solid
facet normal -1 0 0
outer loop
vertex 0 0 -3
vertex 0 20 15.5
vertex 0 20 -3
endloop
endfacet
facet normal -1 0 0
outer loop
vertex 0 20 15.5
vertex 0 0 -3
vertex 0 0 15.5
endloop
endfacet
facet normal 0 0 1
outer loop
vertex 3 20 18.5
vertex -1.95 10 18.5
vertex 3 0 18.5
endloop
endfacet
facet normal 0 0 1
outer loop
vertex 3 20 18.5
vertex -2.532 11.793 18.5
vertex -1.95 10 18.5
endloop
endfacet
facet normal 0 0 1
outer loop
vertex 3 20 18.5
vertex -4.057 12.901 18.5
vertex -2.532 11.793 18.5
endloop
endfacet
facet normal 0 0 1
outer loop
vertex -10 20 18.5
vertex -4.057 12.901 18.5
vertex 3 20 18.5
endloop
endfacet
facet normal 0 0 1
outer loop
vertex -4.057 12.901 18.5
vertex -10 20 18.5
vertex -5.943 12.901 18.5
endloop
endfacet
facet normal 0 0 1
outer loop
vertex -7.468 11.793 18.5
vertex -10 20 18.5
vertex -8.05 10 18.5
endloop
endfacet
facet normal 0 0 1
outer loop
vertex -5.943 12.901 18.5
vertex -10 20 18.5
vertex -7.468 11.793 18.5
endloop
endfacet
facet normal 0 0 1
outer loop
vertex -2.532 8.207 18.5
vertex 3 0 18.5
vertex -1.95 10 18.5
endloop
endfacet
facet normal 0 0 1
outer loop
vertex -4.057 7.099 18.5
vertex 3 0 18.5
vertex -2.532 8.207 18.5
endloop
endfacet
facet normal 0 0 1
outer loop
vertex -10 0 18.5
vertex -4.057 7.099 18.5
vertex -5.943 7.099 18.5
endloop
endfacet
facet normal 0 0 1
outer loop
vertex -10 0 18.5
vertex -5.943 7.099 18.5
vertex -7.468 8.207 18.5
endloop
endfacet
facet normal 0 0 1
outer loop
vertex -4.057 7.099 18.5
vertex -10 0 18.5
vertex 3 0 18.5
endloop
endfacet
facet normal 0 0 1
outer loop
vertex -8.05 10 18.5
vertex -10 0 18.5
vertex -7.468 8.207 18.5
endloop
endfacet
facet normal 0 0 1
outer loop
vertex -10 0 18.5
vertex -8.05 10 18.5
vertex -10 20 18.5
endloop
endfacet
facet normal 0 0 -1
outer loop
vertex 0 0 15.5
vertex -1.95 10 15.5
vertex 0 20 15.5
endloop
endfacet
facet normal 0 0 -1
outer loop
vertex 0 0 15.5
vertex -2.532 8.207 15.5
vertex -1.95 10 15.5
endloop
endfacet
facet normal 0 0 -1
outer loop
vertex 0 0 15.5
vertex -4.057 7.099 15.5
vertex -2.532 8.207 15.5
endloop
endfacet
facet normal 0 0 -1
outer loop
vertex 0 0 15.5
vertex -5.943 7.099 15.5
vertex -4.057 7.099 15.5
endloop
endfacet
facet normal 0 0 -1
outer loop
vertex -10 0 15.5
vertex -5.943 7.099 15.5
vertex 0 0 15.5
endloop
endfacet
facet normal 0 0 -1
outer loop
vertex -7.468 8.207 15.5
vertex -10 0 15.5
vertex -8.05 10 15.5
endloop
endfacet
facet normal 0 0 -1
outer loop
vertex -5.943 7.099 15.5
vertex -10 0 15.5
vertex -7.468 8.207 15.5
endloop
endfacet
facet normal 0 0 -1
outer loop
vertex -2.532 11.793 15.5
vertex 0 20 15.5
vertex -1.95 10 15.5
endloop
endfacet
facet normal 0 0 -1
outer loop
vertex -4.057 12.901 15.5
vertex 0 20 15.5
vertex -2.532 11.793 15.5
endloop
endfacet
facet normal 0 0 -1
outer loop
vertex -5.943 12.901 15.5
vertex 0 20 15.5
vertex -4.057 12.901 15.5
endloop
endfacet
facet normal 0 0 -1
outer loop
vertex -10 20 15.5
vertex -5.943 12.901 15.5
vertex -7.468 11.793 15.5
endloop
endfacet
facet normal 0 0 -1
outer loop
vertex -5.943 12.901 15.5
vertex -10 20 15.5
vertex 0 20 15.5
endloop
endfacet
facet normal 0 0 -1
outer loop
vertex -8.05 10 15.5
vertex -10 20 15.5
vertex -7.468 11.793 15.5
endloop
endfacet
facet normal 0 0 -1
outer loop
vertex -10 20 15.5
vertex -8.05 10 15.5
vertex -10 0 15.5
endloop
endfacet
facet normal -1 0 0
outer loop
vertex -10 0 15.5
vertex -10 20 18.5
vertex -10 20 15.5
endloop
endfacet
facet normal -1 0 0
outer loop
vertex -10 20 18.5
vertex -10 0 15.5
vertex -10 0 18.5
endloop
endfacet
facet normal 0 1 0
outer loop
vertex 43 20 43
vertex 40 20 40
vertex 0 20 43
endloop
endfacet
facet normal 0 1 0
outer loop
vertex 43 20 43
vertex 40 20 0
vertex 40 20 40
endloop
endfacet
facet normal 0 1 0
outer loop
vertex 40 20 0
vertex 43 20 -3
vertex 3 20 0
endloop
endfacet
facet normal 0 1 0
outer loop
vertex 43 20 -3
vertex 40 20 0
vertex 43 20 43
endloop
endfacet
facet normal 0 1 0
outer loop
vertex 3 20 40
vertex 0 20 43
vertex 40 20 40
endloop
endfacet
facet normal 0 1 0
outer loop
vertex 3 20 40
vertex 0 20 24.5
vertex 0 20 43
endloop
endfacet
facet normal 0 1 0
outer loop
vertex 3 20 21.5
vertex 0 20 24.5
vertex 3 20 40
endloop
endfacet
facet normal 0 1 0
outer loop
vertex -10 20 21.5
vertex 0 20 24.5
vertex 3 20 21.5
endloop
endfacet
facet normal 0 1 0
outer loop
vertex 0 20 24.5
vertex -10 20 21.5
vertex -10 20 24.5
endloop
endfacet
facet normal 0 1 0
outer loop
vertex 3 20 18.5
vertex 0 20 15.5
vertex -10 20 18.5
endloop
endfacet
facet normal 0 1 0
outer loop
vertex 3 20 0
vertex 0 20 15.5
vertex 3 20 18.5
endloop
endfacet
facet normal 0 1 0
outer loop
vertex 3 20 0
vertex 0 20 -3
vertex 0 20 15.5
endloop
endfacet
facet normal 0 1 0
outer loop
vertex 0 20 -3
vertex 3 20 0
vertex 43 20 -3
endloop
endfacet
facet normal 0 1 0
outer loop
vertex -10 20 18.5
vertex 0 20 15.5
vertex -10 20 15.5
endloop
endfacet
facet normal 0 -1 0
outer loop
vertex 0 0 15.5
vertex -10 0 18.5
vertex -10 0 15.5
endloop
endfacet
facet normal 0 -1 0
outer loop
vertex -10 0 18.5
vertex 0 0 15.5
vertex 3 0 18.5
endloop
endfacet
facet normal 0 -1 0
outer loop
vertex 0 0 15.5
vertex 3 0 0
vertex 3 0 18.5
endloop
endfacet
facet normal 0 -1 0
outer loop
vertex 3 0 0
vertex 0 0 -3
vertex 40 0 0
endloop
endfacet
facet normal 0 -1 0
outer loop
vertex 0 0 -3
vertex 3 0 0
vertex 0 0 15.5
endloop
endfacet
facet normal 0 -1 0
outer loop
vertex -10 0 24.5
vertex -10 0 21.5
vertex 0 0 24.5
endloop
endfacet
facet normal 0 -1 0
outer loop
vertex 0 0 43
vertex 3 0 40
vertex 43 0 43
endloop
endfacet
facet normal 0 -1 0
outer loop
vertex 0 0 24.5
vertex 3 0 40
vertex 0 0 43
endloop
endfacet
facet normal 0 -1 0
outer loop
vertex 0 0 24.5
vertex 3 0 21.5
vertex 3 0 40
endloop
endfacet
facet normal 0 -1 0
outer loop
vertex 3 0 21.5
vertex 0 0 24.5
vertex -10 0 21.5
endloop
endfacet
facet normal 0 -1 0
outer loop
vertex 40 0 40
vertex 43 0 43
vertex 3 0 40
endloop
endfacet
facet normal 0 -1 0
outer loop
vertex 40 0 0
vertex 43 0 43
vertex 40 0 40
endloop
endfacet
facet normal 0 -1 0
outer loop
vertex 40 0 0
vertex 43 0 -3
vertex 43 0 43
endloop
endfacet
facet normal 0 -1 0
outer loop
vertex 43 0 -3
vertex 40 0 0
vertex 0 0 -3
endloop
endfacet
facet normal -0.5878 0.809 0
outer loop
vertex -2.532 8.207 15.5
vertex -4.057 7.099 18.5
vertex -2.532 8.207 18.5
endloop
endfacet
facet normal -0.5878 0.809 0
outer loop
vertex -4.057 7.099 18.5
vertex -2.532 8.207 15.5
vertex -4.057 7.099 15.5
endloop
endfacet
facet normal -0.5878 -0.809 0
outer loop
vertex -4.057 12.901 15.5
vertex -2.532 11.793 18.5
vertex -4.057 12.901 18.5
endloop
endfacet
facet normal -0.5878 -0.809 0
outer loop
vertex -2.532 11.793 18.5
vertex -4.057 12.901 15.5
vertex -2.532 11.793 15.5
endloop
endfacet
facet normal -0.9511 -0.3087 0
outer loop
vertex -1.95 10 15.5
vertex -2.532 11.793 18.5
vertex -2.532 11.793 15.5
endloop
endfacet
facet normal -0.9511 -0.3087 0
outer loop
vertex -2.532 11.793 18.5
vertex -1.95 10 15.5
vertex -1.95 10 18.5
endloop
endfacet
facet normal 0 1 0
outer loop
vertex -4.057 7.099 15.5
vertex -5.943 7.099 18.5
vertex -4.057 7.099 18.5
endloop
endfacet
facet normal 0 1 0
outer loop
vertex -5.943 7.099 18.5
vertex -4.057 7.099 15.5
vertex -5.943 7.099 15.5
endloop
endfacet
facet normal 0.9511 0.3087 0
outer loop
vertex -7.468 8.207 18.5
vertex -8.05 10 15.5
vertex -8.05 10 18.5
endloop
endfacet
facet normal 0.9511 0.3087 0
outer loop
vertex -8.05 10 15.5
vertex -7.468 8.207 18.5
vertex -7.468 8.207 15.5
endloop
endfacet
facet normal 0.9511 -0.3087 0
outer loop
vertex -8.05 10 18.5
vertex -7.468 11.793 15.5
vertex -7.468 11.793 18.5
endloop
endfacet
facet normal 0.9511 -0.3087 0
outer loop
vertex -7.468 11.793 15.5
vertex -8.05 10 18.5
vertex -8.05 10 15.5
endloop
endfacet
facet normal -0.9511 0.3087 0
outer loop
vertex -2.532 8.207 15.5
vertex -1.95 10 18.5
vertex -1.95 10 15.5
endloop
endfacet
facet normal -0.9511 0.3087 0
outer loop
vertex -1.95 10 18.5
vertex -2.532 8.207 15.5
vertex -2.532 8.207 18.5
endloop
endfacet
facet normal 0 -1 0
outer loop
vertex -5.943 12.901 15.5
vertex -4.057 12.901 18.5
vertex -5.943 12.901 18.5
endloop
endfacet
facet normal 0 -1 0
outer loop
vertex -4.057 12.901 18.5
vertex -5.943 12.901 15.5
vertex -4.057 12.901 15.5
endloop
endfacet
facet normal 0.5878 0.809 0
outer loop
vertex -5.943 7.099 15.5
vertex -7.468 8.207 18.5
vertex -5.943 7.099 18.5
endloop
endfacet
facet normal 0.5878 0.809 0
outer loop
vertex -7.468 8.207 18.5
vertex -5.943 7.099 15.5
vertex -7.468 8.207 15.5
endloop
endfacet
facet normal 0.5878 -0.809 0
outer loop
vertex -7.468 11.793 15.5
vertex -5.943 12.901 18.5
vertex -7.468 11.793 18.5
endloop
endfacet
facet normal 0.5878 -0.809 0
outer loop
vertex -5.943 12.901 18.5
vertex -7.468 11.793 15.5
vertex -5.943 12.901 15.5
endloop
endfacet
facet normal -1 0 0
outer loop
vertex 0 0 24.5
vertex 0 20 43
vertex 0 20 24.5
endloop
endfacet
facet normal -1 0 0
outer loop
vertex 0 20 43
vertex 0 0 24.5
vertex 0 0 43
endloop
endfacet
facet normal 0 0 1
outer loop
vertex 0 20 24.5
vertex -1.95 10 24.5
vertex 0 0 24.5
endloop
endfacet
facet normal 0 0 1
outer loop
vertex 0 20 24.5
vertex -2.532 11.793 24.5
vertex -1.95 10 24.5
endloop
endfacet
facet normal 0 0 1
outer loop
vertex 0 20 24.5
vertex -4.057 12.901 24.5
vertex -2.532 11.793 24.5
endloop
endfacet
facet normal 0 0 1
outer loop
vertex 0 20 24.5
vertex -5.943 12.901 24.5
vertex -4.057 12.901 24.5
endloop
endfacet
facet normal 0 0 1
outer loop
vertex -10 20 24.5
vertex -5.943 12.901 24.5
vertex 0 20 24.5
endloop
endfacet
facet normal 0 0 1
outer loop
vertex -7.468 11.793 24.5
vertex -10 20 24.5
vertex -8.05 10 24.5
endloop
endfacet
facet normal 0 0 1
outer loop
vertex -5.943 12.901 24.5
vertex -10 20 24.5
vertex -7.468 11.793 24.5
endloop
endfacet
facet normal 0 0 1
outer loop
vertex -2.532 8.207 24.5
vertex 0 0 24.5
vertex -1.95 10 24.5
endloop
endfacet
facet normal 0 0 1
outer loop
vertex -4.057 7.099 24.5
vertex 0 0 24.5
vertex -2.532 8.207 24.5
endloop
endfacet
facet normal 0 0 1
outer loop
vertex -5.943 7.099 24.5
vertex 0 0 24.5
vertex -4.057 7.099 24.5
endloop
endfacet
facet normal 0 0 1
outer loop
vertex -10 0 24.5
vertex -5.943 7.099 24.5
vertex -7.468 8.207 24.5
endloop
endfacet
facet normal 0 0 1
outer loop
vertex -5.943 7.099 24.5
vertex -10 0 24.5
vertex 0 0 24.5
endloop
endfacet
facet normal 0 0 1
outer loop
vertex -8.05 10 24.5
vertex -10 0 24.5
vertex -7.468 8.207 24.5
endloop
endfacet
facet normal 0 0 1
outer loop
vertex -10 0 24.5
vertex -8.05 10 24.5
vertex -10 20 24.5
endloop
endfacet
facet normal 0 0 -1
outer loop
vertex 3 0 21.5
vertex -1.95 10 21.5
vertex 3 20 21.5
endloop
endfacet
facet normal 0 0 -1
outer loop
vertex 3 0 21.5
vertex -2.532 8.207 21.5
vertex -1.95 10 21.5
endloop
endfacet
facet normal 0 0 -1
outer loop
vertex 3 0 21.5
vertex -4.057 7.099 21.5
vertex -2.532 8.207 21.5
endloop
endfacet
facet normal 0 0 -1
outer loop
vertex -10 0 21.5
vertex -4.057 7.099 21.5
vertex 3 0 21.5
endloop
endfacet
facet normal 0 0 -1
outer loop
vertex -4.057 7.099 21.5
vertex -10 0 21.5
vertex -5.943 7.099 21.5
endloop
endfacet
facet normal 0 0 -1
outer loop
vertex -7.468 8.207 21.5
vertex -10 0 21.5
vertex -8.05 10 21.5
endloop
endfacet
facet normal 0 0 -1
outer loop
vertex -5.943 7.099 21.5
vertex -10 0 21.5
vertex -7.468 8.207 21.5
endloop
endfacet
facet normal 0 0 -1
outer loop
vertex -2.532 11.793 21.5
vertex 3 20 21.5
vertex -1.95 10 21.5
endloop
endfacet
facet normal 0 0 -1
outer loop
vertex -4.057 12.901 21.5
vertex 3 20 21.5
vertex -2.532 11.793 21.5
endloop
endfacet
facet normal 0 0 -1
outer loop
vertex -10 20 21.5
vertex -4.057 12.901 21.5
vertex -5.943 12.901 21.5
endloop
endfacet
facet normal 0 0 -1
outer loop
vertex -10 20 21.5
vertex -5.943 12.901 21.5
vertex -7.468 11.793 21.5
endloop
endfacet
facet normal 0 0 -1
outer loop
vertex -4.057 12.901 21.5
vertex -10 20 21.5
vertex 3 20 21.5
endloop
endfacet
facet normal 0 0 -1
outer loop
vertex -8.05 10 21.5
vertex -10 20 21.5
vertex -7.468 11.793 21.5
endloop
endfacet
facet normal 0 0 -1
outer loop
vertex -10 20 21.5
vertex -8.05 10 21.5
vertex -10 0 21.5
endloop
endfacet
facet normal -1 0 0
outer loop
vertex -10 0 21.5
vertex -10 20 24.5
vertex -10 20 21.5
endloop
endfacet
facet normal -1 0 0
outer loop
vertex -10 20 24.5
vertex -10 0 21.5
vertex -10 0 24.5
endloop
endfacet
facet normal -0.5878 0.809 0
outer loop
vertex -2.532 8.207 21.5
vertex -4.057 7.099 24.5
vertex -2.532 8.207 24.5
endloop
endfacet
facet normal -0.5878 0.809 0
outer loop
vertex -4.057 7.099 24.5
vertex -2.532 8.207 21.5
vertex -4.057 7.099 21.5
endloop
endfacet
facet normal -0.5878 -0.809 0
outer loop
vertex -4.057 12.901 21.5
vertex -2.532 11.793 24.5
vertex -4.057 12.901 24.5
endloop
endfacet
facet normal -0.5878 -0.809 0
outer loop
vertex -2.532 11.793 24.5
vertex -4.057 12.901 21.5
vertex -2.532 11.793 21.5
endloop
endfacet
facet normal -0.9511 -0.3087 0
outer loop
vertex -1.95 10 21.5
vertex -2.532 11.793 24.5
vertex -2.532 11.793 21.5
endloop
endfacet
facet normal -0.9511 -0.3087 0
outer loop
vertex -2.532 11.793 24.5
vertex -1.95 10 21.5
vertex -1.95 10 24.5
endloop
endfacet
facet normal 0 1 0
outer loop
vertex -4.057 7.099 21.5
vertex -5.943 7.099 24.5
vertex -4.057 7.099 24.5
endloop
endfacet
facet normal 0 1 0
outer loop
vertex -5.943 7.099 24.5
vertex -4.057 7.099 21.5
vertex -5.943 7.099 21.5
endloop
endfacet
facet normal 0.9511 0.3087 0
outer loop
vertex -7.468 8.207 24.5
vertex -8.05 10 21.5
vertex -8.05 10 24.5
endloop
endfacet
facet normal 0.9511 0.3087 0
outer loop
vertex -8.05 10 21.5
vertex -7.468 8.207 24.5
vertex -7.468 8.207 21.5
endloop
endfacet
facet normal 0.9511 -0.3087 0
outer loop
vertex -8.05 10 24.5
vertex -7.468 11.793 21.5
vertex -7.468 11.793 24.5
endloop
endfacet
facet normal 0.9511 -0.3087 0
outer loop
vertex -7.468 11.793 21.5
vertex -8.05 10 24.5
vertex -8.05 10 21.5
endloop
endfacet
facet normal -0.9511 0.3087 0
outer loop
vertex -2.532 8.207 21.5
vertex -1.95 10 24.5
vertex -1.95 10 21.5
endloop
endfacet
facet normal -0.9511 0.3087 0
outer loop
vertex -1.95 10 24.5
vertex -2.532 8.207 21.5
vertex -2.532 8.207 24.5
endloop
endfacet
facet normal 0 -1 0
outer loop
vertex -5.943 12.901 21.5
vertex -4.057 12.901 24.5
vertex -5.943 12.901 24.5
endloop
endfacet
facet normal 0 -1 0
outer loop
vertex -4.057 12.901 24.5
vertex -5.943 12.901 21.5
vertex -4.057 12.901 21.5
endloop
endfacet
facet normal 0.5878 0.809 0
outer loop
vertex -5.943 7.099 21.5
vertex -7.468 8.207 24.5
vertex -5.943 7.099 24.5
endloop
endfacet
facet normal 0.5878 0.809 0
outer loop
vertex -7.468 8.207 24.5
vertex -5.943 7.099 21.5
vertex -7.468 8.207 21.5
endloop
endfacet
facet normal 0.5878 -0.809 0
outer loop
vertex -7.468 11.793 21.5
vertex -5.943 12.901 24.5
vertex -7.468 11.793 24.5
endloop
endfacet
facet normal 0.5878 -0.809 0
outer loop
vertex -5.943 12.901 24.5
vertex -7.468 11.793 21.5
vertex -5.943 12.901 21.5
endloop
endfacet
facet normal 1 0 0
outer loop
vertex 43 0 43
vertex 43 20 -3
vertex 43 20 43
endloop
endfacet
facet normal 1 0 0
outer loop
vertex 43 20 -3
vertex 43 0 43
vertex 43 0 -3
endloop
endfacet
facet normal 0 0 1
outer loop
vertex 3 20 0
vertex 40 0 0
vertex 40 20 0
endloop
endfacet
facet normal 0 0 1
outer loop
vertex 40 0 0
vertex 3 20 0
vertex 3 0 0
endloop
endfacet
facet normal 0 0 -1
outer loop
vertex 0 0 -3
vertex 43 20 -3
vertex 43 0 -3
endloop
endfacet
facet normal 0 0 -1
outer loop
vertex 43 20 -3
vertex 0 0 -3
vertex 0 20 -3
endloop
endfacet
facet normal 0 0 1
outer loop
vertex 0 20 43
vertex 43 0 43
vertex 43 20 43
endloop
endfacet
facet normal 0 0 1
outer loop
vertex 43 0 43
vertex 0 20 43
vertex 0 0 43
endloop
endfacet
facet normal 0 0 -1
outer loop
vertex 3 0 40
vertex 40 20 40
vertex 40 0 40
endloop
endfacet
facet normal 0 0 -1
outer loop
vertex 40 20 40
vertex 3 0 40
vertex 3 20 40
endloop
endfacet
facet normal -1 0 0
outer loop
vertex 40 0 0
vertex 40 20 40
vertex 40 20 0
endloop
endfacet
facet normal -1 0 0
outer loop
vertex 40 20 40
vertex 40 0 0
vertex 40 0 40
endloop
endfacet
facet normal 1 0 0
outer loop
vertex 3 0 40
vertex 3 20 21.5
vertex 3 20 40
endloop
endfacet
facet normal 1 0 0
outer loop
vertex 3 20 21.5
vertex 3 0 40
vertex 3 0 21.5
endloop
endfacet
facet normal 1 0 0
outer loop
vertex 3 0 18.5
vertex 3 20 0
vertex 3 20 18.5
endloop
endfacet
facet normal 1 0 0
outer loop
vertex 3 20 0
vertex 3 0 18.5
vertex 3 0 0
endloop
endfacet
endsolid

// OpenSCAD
tubesize=40;
wallwidth=3;
tubewidth=20;
clipwidth=10;
holesize=6.1;

union() {
    translate([0, 0, -wallwidth]) { wallside(); }
    translate([0, 0, tubesize]) { wallside(); }
    translate([tubesize, 0, tubesize]) { rotate([0, 90, 0]) wallside(); }
    translate([0, 0, tubesize]) { rotate([0, 90, 0]) wallsidelessthanhalf(); }
    translate([0, 0, (tubesize / 2) - (wallwidth / 2)]) { rotate([0, 90, 0]) wallsidelessthanhalf(); }
    translate([-clipwidth, 0, (tubesize / 2) - (wallwidth * 1.5 )]) { clip(); }
        translate([-clipwidth, 0, (tubesize / 2) + (wallwidth * 0.5)]) { clip(); }
}

module clip() {
    difference(){
        cube([clipwidth, tubewidth, wallwidth]);
        translate([clipwidth / 2, tubewidth / 2, 0]) { cylinder(wallwidth, holesize / 2, holesize / 2); }
    }
}

module wallside() {
    cube([tubesize + wallwidth, tubewidth, wallwidth]);
}

module wallsidelessthanhalf() {
    cube([(tubesize / 2) - (wallwidth / 2), tubewidth, wallwidth]);
}
